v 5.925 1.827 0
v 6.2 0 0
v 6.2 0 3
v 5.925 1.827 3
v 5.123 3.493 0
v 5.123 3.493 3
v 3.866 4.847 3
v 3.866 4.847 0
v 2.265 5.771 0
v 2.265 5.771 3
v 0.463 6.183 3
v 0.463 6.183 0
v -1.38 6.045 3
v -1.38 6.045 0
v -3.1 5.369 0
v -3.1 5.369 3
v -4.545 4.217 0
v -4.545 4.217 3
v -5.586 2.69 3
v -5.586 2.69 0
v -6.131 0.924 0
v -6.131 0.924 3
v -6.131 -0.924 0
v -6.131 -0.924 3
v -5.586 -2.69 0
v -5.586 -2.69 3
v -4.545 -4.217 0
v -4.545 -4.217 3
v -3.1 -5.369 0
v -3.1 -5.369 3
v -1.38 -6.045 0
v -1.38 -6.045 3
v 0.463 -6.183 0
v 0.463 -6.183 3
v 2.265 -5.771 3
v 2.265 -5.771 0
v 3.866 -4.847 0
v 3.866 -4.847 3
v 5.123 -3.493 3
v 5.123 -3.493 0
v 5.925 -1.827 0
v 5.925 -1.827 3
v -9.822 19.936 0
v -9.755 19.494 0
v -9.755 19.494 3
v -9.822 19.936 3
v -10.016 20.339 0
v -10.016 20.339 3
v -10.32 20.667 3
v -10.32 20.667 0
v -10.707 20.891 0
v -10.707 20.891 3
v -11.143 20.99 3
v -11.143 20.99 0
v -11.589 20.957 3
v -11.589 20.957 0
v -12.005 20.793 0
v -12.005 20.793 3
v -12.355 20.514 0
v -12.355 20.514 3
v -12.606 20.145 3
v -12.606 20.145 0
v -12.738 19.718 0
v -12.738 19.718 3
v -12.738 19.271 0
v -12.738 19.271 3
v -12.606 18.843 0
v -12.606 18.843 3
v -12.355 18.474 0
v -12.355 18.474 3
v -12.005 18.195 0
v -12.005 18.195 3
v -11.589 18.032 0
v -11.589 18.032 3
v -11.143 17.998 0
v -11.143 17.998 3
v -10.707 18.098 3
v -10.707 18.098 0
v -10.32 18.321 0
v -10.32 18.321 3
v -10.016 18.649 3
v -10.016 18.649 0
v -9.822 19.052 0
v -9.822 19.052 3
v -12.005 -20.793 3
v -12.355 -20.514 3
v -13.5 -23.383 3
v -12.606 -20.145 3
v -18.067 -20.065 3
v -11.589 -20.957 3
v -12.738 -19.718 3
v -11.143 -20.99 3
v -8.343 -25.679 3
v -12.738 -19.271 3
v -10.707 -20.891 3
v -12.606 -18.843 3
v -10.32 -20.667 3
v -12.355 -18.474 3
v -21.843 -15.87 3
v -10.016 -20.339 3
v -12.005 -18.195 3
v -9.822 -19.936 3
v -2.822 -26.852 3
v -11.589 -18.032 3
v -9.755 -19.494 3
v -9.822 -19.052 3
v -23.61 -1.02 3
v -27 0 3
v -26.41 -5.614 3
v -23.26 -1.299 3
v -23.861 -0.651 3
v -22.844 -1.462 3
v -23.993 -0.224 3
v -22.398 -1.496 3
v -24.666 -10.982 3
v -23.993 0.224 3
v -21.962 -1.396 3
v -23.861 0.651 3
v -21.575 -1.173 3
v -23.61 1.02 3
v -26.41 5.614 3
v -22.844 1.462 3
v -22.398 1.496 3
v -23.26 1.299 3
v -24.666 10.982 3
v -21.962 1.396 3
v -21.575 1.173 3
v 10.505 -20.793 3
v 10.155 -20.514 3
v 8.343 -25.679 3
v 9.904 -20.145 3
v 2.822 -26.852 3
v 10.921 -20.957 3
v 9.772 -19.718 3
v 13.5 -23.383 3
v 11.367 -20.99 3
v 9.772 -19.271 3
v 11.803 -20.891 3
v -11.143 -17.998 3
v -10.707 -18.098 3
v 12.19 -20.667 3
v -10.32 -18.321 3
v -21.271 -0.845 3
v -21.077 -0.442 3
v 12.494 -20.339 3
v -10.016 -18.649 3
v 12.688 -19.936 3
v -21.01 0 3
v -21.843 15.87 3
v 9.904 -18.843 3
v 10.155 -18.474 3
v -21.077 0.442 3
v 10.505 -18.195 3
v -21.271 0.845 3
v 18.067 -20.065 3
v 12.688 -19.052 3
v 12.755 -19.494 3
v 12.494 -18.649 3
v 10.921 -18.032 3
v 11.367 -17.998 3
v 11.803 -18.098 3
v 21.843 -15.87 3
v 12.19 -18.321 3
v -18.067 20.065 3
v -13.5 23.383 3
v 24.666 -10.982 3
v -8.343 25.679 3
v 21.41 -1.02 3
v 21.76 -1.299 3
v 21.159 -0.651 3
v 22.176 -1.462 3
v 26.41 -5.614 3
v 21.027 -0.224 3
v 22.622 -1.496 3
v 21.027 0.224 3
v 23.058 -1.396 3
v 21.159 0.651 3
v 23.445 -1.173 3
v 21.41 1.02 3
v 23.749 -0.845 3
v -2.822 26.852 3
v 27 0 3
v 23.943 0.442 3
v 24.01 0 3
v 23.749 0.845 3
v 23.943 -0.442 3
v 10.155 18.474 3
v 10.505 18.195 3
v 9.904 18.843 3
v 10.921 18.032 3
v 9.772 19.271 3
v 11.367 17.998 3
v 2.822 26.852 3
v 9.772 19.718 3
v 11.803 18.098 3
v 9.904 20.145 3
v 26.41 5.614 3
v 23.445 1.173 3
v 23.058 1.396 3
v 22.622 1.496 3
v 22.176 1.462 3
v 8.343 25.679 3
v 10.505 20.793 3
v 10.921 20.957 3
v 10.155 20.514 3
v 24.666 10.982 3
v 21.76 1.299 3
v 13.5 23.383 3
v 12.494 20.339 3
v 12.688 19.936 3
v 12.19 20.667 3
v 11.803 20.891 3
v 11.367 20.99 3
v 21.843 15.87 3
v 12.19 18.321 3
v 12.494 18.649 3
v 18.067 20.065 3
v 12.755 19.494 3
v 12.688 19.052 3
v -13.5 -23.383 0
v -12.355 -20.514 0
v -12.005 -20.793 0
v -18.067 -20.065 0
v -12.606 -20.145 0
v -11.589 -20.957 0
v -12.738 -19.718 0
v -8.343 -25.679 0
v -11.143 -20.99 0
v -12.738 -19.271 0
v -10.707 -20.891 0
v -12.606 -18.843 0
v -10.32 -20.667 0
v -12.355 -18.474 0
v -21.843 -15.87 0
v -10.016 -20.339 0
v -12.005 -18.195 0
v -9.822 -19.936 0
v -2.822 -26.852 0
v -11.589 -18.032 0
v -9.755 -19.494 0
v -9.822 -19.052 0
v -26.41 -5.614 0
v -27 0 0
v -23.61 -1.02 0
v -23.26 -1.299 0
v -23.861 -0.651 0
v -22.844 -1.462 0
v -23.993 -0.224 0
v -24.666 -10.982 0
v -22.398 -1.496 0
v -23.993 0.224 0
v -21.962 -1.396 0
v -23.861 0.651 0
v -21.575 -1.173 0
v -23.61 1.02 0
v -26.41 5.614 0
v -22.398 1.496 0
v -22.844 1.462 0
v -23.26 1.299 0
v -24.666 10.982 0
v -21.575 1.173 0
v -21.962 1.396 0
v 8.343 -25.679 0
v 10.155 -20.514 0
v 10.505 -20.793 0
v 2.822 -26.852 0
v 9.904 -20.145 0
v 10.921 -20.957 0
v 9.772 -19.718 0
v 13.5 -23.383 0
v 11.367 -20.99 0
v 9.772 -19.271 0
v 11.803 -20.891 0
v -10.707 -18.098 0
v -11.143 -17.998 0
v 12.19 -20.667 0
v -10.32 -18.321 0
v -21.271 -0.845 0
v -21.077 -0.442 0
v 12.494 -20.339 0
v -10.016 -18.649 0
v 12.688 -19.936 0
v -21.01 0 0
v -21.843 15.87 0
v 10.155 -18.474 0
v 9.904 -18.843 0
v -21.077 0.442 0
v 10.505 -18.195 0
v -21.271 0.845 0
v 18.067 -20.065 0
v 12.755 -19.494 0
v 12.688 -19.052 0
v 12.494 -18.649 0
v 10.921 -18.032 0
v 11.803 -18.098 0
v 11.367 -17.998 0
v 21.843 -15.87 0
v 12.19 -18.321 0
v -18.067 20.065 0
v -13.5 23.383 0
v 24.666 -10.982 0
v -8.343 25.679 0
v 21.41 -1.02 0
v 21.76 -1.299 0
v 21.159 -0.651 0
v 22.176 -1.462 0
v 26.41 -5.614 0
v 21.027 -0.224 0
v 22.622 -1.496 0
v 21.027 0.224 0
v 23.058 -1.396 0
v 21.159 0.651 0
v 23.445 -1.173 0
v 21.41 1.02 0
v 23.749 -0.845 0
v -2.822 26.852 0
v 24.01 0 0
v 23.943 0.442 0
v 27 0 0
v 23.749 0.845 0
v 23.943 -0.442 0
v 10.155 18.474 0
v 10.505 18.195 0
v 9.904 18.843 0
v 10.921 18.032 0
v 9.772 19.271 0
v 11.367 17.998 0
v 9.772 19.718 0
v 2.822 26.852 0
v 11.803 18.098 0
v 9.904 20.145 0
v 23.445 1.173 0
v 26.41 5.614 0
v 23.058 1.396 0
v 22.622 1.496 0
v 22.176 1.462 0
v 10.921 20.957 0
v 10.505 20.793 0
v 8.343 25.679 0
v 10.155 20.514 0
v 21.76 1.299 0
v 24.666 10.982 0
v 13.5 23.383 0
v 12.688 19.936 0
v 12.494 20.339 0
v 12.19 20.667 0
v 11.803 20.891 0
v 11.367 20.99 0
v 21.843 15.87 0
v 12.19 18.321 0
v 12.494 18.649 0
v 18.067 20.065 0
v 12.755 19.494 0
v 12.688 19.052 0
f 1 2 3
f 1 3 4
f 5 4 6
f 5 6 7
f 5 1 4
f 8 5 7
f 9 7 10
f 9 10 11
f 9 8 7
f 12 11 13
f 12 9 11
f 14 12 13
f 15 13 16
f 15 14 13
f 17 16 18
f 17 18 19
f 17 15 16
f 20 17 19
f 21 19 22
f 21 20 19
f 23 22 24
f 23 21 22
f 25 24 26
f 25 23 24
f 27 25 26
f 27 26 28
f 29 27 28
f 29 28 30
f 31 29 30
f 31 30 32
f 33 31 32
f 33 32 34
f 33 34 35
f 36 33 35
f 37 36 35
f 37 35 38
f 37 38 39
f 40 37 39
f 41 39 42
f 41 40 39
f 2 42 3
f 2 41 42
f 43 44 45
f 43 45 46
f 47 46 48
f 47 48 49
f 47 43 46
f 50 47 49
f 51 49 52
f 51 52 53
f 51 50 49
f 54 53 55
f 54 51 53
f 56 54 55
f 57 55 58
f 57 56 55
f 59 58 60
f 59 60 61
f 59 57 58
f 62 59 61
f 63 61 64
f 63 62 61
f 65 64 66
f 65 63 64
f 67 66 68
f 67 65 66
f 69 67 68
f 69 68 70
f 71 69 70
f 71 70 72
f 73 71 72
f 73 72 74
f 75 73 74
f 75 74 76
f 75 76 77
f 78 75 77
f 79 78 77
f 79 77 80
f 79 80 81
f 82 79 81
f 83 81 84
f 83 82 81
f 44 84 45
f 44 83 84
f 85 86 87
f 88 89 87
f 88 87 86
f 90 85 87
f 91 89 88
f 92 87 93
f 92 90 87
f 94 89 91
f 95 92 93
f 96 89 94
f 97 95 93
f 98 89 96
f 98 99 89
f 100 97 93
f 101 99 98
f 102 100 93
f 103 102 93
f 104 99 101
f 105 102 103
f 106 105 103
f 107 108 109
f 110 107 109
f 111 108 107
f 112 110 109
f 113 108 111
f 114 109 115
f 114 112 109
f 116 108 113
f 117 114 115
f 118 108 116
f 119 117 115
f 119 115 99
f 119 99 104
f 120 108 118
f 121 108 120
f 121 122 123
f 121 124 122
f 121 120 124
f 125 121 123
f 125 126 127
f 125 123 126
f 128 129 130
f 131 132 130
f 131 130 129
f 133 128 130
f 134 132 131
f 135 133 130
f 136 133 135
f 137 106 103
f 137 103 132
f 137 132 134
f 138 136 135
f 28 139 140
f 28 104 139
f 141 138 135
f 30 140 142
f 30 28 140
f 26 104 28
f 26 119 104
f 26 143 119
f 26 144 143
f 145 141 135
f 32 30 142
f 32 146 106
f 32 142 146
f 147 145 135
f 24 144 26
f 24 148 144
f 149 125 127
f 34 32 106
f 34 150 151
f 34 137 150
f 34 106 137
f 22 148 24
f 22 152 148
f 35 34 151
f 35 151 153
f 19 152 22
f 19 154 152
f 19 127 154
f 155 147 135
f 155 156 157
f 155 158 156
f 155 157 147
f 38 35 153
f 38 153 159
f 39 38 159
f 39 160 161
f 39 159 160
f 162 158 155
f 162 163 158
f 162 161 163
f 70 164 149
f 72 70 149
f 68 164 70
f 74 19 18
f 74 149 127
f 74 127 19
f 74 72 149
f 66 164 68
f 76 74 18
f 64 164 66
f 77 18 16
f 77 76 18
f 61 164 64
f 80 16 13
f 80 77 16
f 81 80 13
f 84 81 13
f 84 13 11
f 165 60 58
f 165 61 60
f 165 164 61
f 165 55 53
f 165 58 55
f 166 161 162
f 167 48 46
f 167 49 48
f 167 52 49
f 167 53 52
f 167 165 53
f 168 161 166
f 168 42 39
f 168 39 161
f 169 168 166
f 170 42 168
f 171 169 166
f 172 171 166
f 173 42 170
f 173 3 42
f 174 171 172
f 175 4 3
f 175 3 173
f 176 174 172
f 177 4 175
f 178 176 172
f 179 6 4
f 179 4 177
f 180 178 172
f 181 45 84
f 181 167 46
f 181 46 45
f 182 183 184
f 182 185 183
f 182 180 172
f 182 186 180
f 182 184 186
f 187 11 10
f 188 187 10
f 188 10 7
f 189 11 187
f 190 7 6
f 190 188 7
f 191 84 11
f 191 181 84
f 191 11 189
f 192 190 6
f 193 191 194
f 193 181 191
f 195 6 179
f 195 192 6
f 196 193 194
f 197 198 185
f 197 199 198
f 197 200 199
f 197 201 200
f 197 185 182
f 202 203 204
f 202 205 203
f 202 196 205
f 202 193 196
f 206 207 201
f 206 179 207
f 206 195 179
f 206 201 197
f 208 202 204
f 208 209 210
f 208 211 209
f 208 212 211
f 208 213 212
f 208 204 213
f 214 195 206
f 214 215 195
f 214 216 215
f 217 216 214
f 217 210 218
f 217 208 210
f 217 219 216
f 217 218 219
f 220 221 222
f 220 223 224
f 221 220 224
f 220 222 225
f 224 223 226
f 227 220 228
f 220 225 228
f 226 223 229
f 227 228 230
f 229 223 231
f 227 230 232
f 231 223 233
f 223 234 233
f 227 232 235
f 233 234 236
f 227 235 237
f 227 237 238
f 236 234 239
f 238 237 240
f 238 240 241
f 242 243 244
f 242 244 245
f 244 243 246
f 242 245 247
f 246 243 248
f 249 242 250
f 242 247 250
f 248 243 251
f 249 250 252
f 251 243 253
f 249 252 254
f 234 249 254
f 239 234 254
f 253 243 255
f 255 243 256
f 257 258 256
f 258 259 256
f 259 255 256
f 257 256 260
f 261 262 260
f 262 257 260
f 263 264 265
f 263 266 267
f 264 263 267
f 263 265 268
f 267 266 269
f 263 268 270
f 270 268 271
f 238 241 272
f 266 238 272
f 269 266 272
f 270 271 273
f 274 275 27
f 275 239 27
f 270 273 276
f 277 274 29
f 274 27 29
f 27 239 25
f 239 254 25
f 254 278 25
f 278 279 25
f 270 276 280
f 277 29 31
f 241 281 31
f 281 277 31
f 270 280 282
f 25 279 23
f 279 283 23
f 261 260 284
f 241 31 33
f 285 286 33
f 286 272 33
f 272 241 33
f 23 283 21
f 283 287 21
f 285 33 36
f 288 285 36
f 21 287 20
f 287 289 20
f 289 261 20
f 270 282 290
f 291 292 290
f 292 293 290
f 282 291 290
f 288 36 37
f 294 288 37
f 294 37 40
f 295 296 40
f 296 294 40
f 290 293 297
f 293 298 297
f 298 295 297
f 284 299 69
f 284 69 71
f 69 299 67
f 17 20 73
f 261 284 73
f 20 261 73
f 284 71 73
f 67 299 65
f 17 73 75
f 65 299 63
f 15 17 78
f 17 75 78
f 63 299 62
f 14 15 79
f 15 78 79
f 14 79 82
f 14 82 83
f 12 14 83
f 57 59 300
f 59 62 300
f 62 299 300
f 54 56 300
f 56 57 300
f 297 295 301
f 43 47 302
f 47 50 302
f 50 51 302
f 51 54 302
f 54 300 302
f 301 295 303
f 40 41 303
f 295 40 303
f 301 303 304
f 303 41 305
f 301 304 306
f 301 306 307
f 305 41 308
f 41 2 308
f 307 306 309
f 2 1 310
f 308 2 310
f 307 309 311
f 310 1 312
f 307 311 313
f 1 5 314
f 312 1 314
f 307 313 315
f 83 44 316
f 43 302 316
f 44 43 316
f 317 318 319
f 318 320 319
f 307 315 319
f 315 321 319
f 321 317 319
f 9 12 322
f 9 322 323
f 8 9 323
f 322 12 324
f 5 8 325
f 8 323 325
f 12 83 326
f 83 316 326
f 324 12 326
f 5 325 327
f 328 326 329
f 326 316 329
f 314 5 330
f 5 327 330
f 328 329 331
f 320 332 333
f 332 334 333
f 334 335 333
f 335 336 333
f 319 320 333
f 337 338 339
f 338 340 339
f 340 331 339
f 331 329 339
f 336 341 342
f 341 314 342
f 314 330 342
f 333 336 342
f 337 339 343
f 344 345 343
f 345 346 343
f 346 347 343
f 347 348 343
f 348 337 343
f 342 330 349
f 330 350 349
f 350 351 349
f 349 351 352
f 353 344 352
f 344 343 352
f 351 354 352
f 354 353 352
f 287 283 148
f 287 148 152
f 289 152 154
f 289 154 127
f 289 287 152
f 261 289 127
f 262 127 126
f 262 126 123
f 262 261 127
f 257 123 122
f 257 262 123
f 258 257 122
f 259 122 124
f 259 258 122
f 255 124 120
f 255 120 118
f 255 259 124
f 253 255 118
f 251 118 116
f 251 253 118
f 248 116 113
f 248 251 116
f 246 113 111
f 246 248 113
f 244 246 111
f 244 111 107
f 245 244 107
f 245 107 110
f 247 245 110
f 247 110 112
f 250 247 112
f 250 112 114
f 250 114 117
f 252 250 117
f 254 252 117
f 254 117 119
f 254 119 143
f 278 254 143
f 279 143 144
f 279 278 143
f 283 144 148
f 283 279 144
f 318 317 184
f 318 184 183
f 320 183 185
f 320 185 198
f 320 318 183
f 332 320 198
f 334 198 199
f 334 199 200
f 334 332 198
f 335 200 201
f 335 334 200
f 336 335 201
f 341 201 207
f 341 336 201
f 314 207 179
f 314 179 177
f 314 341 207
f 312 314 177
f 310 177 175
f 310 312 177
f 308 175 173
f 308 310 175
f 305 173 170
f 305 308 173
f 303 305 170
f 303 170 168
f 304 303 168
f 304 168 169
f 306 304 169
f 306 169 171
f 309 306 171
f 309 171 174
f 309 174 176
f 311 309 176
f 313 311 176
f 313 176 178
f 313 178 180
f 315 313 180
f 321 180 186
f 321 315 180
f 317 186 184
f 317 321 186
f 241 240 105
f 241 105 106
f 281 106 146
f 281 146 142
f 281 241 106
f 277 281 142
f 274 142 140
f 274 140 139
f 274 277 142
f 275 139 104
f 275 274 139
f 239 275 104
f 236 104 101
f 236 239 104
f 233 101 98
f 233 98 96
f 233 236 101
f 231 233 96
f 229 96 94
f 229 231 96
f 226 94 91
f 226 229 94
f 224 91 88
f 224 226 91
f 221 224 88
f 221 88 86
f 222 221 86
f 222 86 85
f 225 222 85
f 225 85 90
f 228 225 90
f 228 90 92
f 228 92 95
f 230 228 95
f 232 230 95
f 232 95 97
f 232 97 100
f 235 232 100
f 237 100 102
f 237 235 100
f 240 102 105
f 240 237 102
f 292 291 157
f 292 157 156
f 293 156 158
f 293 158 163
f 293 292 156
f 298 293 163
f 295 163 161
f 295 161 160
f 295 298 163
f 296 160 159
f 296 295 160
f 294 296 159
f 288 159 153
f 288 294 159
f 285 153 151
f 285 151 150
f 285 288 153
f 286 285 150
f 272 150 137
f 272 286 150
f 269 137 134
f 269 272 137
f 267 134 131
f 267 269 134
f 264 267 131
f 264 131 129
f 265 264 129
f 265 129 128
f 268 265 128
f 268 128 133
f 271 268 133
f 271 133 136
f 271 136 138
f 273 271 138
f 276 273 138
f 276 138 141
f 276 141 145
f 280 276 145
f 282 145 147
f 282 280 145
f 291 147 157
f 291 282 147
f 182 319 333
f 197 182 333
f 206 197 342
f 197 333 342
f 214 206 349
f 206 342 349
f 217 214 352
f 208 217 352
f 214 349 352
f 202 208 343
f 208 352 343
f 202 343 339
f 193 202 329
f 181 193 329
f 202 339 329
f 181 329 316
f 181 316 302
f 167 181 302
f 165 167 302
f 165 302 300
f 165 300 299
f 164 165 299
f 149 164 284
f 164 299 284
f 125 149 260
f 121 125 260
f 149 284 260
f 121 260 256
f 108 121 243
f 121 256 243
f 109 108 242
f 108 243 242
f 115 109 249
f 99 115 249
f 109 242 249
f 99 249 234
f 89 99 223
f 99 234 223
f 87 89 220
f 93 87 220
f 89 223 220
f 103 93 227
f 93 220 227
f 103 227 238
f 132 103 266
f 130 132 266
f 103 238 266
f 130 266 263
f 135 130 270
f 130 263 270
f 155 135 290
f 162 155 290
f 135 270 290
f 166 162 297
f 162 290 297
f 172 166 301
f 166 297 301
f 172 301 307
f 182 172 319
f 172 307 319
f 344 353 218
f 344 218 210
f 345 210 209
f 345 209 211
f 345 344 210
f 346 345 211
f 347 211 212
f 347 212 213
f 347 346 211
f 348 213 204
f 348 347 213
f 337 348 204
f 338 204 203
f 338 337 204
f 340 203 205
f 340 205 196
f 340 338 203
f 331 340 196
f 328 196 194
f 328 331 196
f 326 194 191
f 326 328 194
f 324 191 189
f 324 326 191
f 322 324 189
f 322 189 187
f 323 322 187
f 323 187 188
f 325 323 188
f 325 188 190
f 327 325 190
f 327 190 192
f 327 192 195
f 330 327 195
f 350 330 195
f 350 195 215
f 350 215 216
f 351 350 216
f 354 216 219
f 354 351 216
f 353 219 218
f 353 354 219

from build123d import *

# Parameters (mm, degrees)
SKETCH_2_R      = 27
SKETCH_2_R_2    = 6.2
SKETCH_2_R_3    = 1.5
EXTRUDE_1_DEPTH = 3


with BuildPart() as part:
    # 草图2 → 凸台-拉伸1 (new body)
    with BuildSketch(Plane.XY):
        Circle(SKETCH_2_R)
        Circle(SKETCH_2_R_2, mode=Mode.SUBTRACT)
        with Locations((22.51, 0)):
            Circle(SKETCH_2_R_3, mode=Mode.SUBTRACT)
        with Locations((11.255, -19.494231839)):
            Circle(SKETCH_2_R_3, mode=Mode.SUBTRACT)
        with Locations((-11.255, -19.494231839)):
            Circle(SKETCH_2_R_3, mode=Mode.SUBTRACT)
        with Locations((-22.51, 0)):
            Circle(SKETCH_2_R_3, mode=Mode.SUBTRACT)
        with Locations((-11.255, 19.494231839)):
            Circle(SKETCH_2_R_3, mode=Mode.SUBTRACT)
        with Locations((11.255, 19.494231839)):
            Circle(SKETCH_2_R_3, mode=Mode.SUBTRACT)
    extrude(amount=EXTRUDE_1_DEPTH)


solid = part.part
